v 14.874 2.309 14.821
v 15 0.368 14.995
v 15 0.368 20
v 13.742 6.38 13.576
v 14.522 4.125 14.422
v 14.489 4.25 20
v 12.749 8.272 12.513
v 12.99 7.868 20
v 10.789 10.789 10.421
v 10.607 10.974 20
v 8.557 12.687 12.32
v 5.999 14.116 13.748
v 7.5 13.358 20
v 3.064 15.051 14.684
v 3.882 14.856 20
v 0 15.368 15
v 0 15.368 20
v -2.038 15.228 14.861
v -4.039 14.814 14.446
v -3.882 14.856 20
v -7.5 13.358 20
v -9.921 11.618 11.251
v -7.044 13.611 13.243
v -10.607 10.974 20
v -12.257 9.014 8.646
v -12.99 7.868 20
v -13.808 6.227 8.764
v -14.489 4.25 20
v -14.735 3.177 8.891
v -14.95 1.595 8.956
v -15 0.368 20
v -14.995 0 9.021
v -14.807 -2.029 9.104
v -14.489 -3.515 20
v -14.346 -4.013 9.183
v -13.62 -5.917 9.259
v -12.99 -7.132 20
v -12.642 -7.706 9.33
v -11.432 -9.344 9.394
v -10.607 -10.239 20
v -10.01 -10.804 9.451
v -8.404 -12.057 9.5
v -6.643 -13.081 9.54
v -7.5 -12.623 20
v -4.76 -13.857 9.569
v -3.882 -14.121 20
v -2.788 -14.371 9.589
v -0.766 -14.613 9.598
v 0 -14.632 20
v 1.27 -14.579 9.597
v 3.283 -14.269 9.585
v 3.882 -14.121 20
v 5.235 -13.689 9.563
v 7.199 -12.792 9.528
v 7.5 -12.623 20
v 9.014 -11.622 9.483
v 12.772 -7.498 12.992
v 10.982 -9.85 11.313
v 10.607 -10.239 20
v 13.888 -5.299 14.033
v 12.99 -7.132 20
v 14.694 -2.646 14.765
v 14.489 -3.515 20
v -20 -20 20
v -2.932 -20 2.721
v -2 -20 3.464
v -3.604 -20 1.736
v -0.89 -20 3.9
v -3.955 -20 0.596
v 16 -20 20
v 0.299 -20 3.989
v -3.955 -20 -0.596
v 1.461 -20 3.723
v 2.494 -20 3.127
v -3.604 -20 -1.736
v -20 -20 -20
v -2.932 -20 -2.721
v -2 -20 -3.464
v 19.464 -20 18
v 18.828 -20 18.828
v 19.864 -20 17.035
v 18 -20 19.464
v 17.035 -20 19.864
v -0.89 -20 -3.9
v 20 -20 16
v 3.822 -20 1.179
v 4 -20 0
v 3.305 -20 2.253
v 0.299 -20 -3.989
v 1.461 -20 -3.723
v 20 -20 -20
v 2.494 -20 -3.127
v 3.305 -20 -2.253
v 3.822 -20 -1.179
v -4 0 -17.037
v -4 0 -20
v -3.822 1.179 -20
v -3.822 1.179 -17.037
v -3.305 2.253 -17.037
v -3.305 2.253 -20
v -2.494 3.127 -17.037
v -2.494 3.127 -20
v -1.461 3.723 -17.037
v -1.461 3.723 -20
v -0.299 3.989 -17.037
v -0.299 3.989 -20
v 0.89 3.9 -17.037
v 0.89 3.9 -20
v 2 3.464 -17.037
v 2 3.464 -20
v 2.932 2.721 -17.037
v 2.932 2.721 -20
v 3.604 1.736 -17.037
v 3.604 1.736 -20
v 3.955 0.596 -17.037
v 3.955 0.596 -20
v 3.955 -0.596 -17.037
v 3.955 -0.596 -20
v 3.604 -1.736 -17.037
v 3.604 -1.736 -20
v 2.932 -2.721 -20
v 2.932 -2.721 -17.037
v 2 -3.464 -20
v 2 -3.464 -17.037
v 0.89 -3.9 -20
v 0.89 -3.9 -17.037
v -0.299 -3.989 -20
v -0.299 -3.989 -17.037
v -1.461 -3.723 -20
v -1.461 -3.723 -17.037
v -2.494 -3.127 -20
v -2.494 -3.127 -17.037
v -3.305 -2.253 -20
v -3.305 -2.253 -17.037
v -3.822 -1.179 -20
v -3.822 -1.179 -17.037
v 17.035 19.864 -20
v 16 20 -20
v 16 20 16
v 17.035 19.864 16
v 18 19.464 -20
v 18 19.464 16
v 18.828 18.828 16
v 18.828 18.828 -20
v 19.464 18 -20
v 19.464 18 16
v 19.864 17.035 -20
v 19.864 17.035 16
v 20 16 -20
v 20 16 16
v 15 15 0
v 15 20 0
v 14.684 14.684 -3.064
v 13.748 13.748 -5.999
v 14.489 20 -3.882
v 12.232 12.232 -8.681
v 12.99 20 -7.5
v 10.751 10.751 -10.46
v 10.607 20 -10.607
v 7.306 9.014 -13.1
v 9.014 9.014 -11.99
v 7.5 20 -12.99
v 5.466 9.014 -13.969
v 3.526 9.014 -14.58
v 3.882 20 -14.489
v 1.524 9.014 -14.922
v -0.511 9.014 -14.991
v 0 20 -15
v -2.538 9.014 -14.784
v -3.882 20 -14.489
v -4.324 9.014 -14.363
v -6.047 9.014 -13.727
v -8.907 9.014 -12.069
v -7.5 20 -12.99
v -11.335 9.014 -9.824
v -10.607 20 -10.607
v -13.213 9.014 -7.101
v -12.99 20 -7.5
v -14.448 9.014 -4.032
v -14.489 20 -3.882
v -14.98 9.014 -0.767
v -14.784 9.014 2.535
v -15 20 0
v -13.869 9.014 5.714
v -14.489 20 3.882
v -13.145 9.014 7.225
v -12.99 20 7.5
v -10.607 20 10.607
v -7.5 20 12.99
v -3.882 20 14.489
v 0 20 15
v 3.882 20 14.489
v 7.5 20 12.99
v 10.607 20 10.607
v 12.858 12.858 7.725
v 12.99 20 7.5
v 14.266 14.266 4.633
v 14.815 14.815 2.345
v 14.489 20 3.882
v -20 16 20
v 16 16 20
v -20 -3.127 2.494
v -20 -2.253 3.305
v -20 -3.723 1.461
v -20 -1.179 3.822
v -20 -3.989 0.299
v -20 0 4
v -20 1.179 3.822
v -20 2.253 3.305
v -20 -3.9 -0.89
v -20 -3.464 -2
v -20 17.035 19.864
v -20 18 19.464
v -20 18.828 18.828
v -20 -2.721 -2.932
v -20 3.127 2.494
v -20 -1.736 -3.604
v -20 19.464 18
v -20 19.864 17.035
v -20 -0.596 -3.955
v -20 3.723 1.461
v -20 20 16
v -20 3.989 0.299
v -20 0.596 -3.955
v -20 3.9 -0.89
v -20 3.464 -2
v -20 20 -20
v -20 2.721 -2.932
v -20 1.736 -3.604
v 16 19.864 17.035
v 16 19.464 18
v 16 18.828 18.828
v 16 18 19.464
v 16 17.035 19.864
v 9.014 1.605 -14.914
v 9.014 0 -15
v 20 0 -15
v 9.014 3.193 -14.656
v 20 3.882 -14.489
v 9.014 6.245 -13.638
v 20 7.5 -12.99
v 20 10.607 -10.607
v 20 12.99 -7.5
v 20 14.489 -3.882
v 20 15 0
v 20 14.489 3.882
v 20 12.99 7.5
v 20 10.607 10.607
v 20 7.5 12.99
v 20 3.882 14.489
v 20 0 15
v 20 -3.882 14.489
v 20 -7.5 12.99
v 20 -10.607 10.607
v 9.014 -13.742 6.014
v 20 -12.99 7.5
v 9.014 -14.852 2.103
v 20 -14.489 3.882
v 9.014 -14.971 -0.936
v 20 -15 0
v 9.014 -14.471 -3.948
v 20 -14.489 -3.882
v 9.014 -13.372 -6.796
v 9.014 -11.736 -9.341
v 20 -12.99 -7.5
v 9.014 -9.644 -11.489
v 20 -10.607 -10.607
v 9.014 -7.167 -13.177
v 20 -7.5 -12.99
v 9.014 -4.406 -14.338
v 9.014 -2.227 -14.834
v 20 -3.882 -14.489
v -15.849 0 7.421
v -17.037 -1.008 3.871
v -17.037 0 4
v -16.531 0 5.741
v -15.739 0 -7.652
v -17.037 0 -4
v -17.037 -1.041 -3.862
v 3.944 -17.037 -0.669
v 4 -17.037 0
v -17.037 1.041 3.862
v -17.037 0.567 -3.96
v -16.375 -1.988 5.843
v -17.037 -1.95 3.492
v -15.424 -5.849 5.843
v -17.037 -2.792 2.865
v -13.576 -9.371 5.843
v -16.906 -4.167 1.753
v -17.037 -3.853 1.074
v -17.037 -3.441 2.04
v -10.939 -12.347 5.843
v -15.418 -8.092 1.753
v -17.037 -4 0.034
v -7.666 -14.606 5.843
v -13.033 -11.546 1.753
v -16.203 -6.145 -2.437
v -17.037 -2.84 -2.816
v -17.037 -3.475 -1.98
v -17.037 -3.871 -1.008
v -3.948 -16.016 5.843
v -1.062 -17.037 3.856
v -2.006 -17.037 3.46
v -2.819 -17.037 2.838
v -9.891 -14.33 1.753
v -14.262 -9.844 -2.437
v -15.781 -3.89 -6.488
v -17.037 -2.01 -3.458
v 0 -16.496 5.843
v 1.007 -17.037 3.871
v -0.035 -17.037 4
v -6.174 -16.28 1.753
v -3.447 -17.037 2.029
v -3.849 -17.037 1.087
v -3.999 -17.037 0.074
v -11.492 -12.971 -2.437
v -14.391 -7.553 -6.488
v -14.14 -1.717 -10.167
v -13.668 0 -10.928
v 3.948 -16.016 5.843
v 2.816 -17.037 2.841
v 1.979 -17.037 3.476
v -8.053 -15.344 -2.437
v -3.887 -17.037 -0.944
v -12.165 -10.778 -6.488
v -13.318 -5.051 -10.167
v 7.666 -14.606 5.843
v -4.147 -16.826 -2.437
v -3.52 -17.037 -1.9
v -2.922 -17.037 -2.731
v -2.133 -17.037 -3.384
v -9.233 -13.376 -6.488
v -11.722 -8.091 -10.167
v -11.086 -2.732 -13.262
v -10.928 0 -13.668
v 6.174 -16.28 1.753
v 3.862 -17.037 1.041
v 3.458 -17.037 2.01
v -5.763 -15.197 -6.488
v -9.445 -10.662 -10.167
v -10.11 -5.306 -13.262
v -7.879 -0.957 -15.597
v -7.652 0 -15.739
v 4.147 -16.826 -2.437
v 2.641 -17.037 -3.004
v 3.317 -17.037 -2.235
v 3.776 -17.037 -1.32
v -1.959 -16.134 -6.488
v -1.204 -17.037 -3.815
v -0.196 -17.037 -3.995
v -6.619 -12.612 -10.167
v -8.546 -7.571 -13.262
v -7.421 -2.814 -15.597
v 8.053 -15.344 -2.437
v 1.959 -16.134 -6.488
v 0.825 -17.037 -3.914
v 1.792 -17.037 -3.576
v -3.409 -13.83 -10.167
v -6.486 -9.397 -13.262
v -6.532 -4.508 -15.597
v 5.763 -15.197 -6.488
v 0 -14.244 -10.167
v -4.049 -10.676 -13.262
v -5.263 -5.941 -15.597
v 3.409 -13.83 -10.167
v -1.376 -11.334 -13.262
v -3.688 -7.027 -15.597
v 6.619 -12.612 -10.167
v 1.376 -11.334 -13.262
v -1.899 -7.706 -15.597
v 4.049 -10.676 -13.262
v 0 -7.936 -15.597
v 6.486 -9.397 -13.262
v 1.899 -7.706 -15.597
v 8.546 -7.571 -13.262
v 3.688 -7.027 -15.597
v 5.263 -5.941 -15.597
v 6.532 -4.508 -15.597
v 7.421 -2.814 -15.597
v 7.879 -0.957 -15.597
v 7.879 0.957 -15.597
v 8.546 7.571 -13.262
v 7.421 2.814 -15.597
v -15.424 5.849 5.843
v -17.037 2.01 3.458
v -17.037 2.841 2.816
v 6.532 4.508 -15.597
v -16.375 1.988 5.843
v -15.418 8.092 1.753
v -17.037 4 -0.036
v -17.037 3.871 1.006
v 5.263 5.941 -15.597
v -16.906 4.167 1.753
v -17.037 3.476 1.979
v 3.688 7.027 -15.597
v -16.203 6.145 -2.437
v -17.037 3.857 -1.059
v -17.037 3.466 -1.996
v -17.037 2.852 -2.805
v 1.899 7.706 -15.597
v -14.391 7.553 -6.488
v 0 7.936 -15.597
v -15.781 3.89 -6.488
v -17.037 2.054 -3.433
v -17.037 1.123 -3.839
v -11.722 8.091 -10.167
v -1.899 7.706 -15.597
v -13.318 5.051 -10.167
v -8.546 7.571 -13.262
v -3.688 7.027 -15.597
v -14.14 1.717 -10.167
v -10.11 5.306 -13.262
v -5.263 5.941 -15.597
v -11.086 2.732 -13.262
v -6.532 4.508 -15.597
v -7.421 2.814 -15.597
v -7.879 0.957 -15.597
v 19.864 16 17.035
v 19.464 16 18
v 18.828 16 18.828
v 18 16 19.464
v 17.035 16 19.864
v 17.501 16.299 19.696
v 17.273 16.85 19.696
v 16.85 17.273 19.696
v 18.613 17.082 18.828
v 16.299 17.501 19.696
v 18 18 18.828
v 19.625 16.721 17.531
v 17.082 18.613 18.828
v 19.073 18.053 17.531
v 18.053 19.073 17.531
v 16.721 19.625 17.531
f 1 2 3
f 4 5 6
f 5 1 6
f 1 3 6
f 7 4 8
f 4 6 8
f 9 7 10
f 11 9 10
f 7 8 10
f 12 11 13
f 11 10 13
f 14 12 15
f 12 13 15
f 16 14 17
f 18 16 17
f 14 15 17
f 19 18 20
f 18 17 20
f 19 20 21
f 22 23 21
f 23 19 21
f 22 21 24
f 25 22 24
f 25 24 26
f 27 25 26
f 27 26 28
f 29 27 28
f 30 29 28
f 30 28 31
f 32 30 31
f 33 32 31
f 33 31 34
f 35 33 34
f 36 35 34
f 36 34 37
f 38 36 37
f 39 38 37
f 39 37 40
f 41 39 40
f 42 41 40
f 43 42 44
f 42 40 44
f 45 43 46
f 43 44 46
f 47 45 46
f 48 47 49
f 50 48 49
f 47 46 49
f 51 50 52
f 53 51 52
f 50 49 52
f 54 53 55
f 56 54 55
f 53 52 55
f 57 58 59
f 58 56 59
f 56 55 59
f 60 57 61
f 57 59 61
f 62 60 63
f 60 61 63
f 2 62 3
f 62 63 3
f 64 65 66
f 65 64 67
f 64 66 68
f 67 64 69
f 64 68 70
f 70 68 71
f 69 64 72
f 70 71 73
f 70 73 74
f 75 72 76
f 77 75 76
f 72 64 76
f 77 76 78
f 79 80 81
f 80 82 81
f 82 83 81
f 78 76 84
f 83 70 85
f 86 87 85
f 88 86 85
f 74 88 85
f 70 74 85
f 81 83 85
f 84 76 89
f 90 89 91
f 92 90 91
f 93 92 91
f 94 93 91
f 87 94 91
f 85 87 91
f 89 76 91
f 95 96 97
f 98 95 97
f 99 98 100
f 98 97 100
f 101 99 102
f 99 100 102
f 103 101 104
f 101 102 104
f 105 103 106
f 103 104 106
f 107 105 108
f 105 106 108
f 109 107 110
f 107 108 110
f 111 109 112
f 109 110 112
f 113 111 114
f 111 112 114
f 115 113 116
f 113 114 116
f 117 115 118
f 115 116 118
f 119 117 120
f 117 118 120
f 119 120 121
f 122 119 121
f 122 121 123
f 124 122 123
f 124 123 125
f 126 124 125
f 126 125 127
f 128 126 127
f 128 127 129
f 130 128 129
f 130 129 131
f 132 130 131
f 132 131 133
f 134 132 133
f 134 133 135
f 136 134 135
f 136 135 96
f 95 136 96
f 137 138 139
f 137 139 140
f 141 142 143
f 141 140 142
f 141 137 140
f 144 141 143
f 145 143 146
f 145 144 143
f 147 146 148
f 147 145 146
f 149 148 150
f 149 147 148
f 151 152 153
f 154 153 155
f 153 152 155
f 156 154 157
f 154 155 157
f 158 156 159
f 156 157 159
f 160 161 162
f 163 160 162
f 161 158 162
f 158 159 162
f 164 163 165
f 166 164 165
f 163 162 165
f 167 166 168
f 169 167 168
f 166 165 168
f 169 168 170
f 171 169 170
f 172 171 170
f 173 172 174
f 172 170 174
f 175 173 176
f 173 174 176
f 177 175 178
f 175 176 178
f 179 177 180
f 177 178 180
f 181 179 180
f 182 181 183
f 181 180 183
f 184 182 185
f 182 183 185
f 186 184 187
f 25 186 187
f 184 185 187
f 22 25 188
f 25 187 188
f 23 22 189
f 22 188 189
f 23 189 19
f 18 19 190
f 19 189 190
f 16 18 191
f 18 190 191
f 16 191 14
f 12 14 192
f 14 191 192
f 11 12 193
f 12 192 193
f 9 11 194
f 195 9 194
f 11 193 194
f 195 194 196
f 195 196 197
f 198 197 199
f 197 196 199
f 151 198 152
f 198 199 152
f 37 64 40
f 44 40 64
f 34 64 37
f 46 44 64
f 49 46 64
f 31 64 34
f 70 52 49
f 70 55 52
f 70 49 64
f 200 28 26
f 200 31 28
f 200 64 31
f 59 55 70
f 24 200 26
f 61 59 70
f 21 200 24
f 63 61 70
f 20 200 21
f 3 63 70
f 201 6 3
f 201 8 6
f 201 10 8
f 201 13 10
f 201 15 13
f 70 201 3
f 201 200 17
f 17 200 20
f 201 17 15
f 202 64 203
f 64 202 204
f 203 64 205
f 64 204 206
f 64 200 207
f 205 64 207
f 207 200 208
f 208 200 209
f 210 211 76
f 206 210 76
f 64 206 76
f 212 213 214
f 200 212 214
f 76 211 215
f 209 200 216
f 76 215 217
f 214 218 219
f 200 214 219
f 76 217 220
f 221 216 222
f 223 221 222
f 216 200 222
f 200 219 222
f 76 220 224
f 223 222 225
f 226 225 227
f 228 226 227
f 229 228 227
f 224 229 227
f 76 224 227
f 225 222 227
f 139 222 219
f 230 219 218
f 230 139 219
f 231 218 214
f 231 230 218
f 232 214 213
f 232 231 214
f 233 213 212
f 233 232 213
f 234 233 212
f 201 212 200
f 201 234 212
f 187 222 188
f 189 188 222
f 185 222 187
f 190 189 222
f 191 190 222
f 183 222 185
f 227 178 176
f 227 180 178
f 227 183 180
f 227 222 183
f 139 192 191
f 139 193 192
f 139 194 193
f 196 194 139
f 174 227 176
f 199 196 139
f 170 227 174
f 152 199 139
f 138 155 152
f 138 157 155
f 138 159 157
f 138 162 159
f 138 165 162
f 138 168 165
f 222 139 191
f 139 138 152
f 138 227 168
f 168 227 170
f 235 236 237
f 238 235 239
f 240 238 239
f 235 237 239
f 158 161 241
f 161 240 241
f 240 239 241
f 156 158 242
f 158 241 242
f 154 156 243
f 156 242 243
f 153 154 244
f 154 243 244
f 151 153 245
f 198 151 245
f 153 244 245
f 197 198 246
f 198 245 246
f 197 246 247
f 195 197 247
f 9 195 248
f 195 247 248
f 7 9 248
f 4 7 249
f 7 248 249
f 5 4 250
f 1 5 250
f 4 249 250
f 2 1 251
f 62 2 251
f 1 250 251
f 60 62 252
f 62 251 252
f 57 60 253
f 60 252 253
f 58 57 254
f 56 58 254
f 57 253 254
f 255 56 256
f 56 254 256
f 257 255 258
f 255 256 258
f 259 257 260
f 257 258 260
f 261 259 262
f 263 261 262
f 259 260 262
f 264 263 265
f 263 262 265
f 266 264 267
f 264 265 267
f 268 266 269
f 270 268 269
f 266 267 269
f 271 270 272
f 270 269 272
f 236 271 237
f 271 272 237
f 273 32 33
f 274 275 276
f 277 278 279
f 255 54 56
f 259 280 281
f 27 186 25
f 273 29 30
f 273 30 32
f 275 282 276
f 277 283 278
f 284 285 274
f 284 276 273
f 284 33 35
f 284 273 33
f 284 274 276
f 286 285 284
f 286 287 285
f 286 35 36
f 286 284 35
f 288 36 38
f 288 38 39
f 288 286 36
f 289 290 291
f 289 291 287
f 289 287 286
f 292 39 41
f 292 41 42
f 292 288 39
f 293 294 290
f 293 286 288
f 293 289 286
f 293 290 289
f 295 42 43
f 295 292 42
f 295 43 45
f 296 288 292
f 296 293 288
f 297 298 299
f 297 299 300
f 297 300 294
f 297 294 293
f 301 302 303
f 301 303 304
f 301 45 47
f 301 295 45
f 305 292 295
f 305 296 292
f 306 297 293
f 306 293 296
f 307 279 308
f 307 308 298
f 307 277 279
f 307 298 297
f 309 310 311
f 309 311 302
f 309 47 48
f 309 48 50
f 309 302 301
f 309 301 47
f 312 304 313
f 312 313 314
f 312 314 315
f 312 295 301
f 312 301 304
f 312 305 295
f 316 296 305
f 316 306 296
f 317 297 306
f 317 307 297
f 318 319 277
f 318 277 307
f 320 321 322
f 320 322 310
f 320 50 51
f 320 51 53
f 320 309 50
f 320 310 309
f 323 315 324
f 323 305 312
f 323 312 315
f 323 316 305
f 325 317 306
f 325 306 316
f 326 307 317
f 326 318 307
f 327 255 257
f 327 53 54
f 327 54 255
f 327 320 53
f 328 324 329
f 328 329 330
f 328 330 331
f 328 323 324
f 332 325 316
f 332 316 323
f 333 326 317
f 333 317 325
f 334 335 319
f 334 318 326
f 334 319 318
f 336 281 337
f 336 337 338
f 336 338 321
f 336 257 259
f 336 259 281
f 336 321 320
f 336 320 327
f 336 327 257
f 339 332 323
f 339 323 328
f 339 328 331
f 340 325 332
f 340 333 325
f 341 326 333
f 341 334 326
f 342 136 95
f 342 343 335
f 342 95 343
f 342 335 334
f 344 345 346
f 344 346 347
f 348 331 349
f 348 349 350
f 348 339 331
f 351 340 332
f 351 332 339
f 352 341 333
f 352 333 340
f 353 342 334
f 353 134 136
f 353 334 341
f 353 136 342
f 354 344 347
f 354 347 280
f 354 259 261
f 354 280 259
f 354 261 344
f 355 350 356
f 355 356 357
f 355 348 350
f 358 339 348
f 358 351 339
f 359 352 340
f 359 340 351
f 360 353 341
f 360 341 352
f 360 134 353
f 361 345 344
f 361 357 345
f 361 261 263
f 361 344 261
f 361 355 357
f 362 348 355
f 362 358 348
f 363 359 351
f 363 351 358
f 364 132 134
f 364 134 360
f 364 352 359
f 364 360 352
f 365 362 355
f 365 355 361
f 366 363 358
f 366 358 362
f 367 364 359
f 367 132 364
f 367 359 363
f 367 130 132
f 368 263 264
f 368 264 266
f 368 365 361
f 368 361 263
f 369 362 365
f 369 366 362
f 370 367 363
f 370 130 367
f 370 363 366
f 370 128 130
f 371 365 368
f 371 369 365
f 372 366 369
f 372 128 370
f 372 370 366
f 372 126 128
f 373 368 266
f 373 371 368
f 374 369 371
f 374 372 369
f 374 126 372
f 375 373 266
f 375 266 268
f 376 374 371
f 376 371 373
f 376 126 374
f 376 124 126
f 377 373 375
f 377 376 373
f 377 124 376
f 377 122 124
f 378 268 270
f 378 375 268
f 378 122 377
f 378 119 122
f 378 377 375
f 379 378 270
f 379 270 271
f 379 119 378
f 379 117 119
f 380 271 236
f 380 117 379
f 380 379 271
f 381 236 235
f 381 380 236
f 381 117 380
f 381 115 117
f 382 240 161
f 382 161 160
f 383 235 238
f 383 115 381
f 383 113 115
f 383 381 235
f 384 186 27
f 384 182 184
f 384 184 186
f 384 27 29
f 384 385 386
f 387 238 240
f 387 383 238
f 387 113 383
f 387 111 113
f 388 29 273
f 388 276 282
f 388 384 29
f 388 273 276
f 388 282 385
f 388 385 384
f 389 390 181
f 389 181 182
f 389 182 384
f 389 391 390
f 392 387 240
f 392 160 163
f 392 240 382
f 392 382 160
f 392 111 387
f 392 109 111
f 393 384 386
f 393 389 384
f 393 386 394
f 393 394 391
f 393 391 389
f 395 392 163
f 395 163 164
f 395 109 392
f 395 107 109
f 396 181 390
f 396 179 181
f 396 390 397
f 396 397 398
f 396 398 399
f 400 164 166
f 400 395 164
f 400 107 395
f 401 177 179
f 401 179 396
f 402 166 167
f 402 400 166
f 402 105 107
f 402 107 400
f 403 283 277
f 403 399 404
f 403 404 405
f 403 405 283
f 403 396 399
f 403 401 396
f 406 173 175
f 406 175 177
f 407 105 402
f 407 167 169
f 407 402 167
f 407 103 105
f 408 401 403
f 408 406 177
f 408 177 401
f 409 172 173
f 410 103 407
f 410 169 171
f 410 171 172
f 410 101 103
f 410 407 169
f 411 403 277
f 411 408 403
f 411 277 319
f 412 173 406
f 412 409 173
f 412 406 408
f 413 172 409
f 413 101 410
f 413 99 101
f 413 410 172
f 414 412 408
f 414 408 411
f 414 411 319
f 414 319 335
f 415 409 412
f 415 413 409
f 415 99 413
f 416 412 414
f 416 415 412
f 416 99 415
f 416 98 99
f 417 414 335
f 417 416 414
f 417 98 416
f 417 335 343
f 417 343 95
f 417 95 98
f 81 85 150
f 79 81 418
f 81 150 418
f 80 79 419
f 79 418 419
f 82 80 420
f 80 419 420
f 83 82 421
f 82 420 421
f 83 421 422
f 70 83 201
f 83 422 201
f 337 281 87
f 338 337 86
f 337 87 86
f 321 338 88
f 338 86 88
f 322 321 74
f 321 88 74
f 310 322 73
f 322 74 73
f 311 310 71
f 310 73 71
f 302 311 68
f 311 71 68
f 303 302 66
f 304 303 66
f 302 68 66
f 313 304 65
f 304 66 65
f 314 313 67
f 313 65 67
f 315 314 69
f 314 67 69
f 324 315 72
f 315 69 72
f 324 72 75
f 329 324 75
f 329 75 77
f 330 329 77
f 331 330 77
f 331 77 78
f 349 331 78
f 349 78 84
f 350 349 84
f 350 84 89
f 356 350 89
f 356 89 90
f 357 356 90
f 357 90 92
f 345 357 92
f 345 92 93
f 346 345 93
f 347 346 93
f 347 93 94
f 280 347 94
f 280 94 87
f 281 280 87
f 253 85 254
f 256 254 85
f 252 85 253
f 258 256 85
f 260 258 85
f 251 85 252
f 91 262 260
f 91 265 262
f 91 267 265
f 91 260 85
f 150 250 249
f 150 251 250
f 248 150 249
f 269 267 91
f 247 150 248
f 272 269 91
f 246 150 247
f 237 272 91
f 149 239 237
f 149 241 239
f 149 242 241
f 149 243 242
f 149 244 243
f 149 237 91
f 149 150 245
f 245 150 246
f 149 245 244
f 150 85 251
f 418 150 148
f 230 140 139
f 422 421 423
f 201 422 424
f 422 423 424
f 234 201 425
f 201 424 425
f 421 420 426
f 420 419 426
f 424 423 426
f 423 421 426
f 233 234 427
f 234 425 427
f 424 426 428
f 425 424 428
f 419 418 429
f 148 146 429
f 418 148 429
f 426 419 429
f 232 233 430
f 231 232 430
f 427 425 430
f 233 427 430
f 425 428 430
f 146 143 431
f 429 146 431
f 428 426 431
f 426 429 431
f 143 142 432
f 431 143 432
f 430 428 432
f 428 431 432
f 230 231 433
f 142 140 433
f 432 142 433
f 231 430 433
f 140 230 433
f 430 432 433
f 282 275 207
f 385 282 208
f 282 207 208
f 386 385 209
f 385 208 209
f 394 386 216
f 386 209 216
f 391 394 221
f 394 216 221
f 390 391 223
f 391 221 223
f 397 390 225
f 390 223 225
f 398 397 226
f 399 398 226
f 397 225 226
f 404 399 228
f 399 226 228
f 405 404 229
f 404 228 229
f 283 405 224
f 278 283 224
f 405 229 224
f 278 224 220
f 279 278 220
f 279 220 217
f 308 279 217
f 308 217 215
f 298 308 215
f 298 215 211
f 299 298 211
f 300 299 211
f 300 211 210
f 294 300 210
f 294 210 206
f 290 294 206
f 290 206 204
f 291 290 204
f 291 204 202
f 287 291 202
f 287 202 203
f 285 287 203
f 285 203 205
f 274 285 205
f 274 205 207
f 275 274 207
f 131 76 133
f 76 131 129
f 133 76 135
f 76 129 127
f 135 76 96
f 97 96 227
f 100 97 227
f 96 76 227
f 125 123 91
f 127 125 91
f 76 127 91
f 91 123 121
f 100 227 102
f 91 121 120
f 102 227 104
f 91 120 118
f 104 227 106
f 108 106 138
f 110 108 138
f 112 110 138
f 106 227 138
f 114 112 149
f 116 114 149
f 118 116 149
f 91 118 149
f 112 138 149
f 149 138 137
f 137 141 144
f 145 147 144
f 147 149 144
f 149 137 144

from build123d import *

# Parameters (mm, degrees)
SKETCH1_W           = 40
SKETCH1_H           = 40
BOSS_EXTRUDE1_DEPTH = 20
FILLET1_R           = 4
SKETCH12_R          = 15
CUT_EXTRUDE2_DEPTH  = 20
SKETCH13_R          = 15
CUT_EXTRUDE3_DEPTH  = 20
SKETCH14_R          = 15
CUT_EXTRUDE4_DEPTH  = 20
SKETCH15_R          = 4
CUT_EXTRUDE5_DEPTH  = 20
SKETCH16_R          = 4
CUT_EXTRUDE6_DEPTH  = 20
SKETCH17_R          = 4
CUT_EXTRUDE7_DEPTH  = 20


with BuildPart() as part:
    # Sketch1 → Boss-Extrude1 (new body, symmetric)
    with BuildSketch(Plane(origin=(0, 0, 0), x_dir=(1, 0, 0), z_dir=(0, 1, 0))):
        Rectangle(SKETCH1_W, SKETCH1_H)
    extrude(amount=BOSS_EXTRUDE1_DEPTH, both=True)

    # Fillet1
    fillet1_edges = [part.edges().sort_by_distance(p)[0] for p in [
        (20, 20, 0),
        (20, 0, 20),
        (0, 20, 20),
    ]]
    fillet(fillet1_edges, radius=FILLET1_R)

    # Sketch2 → Cut-Revolve1 (revolve, cut)
    with BuildSketch(Plane(origin=(0, 0, 0), x_dir=(1, 0, 0), z_dir=(0, 1, 0))):
        with BuildLine():
            Line((0, 17.5), (0, -17.5))
            ThreePointArc((0, -17.5), (-17.5, 0), (0, 17.5))
        make_face()
    revolve(axis=Axis((0, 0, -20.989422068), (0, 0, 1)), mode=Mode.SUBTRACT)

    # Sketch12 → Cut-Extrude2 (cut)
    with BuildSketch(Plane(origin=(0, 20, 0), x_dir=(1, 0, 0), z_dir=(0, 1, 0))):
        Circle(SKETCH12_R)
    extrude(amount=-CUT_EXTRUDE2_DEPTH, mode=Mode.SUBTRACT)

    # Sketch13 → Cut-Extrude3 (cut)
    with BuildSketch(Plane(origin=(20, 0, 0), x_dir=(0, 0, -1), z_dir=(1, 0, 0))):
        Circle(SKETCH13_R)
    extrude(amount=-CUT_EXTRUDE3_DEPTH, mode=Mode.SUBTRACT)

    # Sketch14 → Cut-Extrude4 (cut)
    with BuildSketch(Plane.XY.offset(20)):
        with Locations((0, 0.367598837)):
            Circle(SKETCH14_R)
    extrude(amount=-CUT_EXTRUDE4_DEPTH, mode=Mode.SUBTRACT)

    # Sketch15 → Cut-Extrude5 (cut)
    with BuildSketch(Plane(origin=(0, 0, -20), x_dir=(-1, 0, 0), z_dir=(0, 0, -1))):
        Circle(SKETCH15_R)
    extrude(amount=-CUT_EXTRUDE5_DEPTH, mode=Mode.SUBTRACT)

    # Sketch16 → Cut-Extrude6 (cut)
    with BuildSketch(Plane.XZ.offset(20)):
        Circle(SKETCH16_R)
    extrude(amount=-CUT_EXTRUDE6_DEPTH, mode=Mode.SUBTRACT)

    # Sketch17 → Cut-Extrude7 (cut)
    with BuildSketch(Plane.ZY.offset(20)):
        Circle(SKETCH17_R)
    extrude(amount=-CUT_EXTRUDE7_DEPTH, mode=Mode.SUBTRACT)


solid = part.part
